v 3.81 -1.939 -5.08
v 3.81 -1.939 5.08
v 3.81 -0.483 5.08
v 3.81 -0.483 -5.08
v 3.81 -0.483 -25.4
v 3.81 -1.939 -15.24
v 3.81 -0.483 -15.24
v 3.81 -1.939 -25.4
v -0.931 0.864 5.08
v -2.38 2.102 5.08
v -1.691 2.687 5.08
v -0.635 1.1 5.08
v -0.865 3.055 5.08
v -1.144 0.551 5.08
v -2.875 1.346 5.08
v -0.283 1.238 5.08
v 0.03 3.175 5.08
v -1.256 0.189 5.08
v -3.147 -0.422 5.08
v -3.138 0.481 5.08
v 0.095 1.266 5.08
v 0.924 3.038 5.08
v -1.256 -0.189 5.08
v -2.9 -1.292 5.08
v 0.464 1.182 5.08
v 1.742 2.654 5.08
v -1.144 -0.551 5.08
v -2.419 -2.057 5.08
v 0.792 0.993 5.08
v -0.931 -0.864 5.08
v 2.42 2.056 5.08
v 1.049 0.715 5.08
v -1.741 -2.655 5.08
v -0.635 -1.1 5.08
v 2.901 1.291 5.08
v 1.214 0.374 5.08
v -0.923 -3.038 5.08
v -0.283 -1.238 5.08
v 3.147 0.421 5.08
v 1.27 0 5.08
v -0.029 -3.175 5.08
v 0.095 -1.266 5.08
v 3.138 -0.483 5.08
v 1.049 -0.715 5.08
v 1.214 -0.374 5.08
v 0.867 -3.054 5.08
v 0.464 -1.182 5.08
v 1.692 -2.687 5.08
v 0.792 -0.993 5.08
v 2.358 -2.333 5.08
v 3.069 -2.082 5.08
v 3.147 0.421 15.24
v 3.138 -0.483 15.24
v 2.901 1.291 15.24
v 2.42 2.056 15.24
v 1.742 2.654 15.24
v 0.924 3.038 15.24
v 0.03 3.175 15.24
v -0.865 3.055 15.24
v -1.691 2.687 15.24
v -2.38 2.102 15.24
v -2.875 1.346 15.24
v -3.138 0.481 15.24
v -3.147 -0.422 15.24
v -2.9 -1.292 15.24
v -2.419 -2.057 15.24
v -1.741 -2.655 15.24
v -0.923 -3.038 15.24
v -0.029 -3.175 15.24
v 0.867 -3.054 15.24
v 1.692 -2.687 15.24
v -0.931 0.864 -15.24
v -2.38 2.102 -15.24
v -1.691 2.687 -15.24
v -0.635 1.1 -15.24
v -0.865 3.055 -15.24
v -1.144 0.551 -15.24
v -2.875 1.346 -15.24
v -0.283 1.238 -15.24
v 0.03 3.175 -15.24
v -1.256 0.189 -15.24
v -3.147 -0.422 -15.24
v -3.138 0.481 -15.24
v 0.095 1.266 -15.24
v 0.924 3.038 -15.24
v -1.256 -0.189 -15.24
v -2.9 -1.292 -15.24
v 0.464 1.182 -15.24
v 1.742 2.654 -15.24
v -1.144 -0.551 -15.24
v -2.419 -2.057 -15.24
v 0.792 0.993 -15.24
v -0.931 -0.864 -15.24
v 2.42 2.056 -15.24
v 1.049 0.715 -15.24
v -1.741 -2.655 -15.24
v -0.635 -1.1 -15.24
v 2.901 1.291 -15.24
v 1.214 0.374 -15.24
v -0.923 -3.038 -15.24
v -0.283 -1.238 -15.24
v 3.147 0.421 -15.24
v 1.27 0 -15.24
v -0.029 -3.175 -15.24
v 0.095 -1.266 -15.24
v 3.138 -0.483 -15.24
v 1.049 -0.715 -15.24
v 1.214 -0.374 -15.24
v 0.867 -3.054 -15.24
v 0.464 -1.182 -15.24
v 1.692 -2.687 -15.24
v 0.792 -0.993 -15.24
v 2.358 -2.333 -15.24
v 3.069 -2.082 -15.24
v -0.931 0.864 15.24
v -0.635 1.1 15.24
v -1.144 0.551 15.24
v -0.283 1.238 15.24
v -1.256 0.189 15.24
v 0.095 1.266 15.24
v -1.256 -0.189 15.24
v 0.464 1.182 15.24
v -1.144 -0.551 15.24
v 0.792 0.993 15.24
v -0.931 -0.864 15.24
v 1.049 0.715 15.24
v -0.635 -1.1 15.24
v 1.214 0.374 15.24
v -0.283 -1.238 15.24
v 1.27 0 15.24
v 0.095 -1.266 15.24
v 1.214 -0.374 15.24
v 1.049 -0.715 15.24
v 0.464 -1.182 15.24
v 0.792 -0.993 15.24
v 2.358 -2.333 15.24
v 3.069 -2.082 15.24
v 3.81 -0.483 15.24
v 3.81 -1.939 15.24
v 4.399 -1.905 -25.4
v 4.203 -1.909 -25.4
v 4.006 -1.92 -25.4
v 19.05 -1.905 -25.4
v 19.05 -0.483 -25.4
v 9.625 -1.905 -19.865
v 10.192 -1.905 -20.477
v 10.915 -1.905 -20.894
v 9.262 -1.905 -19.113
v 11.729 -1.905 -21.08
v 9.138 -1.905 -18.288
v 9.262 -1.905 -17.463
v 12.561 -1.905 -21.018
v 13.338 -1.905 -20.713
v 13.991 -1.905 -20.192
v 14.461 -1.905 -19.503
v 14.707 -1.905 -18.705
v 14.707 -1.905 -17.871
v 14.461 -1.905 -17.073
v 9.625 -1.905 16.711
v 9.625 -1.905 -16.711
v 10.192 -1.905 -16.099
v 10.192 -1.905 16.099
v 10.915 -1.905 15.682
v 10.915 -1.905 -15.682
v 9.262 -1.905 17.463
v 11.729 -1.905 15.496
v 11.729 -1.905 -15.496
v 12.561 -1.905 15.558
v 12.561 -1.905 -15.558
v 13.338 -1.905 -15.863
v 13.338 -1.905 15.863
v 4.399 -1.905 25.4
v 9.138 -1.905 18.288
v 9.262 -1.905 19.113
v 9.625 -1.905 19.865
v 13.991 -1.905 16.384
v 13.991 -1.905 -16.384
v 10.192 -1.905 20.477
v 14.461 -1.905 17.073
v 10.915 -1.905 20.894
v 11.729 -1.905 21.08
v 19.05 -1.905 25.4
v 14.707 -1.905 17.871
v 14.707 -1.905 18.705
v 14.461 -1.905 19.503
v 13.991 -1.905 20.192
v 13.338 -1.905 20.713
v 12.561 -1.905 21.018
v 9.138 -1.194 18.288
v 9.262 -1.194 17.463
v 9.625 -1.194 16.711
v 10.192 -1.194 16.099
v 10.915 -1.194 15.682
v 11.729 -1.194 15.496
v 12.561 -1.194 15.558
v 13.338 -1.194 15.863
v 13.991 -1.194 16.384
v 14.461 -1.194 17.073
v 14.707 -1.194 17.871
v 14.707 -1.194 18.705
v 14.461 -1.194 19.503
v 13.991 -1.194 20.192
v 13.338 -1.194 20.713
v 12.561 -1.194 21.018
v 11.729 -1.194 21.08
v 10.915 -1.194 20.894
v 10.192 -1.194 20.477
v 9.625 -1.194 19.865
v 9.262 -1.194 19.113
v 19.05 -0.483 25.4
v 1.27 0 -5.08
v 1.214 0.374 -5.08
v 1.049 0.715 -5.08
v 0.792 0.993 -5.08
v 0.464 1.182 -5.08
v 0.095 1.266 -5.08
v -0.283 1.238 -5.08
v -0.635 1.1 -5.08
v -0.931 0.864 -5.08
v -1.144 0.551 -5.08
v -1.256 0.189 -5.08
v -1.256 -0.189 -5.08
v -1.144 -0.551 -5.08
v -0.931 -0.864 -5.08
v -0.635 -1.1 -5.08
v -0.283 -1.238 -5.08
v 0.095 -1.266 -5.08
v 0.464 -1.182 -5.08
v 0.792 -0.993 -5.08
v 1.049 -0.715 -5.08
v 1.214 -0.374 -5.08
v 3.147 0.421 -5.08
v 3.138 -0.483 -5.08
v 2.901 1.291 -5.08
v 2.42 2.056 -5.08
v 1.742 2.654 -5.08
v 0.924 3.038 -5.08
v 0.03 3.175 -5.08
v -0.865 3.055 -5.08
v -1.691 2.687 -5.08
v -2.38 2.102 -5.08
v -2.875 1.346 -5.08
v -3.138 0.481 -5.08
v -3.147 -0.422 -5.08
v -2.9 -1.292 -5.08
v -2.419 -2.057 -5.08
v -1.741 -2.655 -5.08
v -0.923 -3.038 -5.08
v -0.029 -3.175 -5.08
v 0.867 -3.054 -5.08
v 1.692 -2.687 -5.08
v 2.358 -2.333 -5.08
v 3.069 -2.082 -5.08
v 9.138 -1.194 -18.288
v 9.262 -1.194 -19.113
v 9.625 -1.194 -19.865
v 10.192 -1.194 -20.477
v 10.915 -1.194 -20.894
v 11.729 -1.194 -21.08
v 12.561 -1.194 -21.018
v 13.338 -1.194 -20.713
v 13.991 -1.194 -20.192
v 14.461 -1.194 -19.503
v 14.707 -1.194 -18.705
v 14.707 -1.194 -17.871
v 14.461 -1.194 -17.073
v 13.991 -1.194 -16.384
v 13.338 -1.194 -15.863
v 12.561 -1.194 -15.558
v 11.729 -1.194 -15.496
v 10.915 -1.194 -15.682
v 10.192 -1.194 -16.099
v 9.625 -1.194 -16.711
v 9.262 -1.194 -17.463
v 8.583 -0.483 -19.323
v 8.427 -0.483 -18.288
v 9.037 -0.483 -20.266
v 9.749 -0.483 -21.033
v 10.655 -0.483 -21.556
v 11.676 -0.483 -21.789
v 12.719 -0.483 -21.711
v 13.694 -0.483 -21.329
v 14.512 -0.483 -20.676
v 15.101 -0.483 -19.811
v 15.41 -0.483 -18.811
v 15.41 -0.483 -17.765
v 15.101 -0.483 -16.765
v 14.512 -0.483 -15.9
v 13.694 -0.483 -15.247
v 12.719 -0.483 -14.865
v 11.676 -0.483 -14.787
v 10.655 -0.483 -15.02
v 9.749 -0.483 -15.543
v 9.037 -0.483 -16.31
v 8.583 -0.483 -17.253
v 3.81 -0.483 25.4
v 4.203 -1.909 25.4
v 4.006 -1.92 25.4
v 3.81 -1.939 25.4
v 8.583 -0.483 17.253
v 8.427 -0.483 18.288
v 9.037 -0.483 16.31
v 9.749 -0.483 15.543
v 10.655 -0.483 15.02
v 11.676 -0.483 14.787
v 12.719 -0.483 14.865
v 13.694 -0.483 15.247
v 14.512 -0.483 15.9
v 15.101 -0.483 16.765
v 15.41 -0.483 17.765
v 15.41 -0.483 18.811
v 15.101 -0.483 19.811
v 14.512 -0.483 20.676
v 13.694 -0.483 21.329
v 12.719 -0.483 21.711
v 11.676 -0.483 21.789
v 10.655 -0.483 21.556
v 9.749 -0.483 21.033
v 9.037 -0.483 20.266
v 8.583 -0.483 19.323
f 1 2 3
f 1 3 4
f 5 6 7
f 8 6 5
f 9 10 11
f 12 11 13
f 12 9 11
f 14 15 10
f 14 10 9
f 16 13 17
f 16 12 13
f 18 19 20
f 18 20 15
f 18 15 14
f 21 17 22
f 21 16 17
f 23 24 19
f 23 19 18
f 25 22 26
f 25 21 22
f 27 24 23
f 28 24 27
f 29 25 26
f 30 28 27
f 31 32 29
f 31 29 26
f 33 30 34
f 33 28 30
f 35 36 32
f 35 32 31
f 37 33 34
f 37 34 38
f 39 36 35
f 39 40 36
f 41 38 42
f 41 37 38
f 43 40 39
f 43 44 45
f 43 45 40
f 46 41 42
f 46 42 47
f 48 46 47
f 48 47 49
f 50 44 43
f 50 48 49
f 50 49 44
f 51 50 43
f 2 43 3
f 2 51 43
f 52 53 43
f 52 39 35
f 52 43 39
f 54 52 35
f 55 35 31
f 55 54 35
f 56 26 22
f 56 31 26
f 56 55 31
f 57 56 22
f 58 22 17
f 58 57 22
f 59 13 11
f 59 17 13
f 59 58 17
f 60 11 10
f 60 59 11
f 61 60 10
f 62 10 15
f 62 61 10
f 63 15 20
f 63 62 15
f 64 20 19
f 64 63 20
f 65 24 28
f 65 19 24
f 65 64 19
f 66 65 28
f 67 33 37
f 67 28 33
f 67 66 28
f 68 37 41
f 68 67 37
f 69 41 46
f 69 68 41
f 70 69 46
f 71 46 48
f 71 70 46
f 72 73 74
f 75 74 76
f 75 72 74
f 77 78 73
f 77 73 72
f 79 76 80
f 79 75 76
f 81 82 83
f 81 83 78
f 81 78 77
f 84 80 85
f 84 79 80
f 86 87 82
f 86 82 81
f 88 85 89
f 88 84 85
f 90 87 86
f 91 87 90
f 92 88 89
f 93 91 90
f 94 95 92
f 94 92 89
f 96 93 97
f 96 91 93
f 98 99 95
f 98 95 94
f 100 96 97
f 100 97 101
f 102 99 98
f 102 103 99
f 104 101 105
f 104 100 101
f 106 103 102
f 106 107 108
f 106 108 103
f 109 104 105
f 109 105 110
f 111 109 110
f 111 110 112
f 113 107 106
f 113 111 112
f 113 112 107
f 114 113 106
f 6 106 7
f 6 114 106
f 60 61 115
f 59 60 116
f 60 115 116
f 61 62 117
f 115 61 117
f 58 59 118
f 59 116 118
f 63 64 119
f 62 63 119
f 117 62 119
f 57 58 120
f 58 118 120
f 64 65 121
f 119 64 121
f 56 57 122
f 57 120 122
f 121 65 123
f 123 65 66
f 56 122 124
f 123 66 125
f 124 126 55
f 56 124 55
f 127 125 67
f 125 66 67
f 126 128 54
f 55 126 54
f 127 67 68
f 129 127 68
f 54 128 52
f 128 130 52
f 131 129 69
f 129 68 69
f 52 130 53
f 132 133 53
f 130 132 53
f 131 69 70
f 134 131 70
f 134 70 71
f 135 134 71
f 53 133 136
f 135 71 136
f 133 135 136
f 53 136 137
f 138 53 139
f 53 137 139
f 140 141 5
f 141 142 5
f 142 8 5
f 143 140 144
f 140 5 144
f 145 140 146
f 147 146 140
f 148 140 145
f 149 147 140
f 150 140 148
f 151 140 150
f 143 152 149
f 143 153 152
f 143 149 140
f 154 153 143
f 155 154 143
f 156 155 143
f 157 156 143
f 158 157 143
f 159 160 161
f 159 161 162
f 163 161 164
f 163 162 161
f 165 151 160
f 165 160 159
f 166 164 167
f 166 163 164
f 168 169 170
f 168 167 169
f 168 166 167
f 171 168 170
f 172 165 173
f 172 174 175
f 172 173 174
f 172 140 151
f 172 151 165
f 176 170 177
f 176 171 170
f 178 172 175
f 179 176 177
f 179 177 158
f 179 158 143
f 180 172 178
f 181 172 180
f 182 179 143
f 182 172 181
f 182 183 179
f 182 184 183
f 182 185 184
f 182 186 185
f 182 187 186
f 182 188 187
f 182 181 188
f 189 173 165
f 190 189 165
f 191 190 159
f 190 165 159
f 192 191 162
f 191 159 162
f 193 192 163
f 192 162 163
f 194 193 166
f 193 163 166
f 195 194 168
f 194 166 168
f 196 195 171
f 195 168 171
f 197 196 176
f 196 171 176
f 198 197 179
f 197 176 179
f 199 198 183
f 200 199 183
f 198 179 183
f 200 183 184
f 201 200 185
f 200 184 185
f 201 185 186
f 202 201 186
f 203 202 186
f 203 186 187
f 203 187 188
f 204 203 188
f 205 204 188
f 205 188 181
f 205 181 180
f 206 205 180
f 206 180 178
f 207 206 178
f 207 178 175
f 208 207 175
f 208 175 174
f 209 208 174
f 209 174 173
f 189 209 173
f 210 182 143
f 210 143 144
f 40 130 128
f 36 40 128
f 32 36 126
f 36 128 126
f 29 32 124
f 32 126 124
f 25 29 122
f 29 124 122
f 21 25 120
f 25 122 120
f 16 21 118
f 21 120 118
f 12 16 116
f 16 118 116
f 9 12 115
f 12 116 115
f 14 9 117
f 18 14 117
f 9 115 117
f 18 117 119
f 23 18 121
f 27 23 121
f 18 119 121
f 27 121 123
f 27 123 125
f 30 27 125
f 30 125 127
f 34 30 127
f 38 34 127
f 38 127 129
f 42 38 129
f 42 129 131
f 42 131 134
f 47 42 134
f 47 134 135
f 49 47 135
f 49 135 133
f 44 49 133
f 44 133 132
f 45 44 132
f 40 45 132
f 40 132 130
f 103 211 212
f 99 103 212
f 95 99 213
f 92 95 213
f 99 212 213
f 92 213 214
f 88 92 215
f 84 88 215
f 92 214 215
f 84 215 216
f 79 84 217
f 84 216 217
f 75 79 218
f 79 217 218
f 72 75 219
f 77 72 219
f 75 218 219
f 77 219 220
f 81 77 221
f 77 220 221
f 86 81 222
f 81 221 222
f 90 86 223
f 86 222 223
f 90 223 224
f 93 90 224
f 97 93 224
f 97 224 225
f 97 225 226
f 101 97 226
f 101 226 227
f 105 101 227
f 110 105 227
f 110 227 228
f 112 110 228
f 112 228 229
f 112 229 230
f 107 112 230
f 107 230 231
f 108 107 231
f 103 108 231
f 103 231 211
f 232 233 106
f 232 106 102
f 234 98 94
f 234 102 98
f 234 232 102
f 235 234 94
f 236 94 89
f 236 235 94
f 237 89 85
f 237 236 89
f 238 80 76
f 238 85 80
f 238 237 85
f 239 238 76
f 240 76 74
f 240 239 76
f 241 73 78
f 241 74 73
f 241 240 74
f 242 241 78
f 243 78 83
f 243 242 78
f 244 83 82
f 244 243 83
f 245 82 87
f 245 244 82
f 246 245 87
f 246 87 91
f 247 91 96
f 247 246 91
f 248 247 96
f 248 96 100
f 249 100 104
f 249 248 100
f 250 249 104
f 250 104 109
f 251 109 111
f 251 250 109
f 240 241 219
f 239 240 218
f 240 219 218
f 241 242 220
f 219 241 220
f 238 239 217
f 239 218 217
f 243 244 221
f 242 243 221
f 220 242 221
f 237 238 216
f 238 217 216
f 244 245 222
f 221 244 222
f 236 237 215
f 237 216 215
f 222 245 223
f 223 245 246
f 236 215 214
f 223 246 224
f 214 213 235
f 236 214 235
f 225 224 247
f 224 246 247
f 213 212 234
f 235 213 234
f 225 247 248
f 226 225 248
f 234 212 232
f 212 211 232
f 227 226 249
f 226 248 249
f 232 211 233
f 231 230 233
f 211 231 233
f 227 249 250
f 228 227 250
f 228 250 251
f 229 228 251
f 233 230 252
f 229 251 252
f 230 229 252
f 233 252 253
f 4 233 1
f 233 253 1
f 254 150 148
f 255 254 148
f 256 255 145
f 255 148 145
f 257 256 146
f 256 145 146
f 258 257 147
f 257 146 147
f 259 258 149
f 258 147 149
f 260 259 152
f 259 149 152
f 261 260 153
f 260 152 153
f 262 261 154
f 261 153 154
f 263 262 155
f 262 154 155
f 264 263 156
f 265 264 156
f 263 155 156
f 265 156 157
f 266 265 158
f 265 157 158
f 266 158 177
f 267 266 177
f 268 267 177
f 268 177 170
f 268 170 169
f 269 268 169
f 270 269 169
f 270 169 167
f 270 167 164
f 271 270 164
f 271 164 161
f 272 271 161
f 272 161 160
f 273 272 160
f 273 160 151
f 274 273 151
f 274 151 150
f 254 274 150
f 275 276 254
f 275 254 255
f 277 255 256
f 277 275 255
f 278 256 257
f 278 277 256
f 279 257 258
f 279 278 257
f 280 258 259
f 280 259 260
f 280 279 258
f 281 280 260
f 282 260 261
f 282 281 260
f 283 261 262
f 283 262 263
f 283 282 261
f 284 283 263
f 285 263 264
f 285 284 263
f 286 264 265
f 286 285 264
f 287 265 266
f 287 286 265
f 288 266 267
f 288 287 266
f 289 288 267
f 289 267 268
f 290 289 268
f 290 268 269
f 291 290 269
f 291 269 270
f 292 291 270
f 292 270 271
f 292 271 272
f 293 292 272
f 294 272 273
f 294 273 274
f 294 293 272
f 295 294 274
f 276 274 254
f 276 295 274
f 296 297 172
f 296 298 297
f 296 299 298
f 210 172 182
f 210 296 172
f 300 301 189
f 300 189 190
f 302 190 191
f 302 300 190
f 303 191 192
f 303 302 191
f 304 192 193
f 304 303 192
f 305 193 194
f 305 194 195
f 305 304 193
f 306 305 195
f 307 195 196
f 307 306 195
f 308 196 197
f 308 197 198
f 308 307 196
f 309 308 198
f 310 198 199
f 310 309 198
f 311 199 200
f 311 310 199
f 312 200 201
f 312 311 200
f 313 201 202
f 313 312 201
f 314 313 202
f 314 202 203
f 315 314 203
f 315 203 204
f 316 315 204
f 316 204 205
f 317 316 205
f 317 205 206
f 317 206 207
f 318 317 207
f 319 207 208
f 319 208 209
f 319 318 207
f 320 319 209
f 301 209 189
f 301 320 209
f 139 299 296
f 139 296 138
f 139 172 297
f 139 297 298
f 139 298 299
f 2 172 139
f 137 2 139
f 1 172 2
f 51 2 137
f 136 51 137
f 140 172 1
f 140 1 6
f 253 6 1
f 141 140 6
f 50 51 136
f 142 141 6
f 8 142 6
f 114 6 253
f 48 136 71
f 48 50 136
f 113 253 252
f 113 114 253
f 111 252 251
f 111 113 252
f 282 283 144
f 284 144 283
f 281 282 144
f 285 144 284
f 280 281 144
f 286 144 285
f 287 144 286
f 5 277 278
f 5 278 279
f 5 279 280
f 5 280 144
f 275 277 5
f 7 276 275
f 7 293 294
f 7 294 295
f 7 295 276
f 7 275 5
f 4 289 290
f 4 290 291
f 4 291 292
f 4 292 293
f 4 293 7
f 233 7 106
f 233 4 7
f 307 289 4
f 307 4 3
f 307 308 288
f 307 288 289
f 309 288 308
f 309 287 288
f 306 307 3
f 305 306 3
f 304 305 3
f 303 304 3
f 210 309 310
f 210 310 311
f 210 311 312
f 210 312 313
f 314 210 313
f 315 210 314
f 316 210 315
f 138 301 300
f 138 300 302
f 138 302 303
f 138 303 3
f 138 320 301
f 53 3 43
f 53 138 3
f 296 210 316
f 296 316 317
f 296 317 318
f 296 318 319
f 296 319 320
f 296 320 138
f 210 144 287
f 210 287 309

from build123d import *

# Parameters (mm, degrees)
SKETCH4_R               = 3.175
BOSS_EXTRUDE2_DEPTH     = 25.4
FILLET1_R               = 5.08
M5_CLEARANCE_HOLE1_D    = 5.6
CUT_EXTRUDE1_DEPTH      = 32.908355123
CUT_EXTRUDE1_DEPTH_BACK = 32.908355123
SKETCH9_W               = 6.985
SKETCH9_H               = 10.16
SKETCH10_R              = 1.27
CUT_EXTRUDE2_DEPTH      = 55.347245805
CHAMFER1_SIZE           = 0.7112


with BuildPart() as part:
    # Sketch4 → Boss-Extrude2 (new, symmetric)
    with BuildSketch(Plane.XY):
        Circle(SKETCH4_R)
        with BuildLine():
            Line((19.050000043, -1.905), (19.050000043, -0.4826))
            Line((19.050000043, -0.4826), (3.138108067, -0.4826))
            ThreePointArc((3.138108067, -0.4826), (2.926778646, -1.230687513), (2.54, -1.905))
            Line((2.54, -1.905), (19.050000043, -1.905))
        make_face()
    extrude(amount=BOSS_EXTRUDE2_DEPTH, both=True)

    # Fillet1
    fillet1_edges = [part.edges().sort_by_distance(p)[0] for p in [
        (2.54, -1.905, 0),
    ]]
    fillet(fillet1_edges, radius=FILLET1_R)

    # M5 Clearance Hole1 (through all)
    with Locations(Plane(origin=(0, -0.4826, 0), x_dir=(1, 0, 0), z_dir=(0, 1, 0))):
        with Locations((11.938000043, 18.288), (11.938000043, -18.288)):
            Hole(M5_CLEARANCE_HOLE1_D / 2)

    # Sketch9 → Cut-Extrude1 (cut, two sides: drawn at the far end of the back side and taken through both)
    with BuildSketch(Plane(origin=(0, 0, 0), x_dir=(1, 0, 0), z_dir=(0, 1, 0)).offset(-CUT_EXTRUDE1_DEPTH_BACK)):
        with Locations((0.3175, -20.32)):
            Rectangle(SKETCH9_W, SKETCH9_H)
        with Locations((0.3175, 0)):
            Rectangle(SKETCH9_W, SKETCH9_H)
        with Locations((0.3175, 20.32)):
            Rectangle(SKETCH9_W, SKETCH9_H)
    extrude(amount=CUT_EXTRUDE1_DEPTH + CUT_EXTRUDE1_DEPTH_BACK, mode=Mode.SUBTRACT)

    # Sketch10 → Cut-Extrude2 (cut, through all)
    with BuildSketch(Plane.XY.offset(25.4)):
        Circle(SKETCH10_R)
    extrude(amount=-CUT_EXTRUDE2_DEPTH, mode=Mode.SUBTRACT)

    # Chamfer1
    chamfer1_edges = [part.edges().sort_by_distance(p)[0] for p in [
        (14.738000043, -0.4826, 18.288),
        (14.738000043, -0.4826, -18.288),
    ]]
    chamfer(chamfer1_edges, length=CHAMFER1_SIZE)


solid = part.part
